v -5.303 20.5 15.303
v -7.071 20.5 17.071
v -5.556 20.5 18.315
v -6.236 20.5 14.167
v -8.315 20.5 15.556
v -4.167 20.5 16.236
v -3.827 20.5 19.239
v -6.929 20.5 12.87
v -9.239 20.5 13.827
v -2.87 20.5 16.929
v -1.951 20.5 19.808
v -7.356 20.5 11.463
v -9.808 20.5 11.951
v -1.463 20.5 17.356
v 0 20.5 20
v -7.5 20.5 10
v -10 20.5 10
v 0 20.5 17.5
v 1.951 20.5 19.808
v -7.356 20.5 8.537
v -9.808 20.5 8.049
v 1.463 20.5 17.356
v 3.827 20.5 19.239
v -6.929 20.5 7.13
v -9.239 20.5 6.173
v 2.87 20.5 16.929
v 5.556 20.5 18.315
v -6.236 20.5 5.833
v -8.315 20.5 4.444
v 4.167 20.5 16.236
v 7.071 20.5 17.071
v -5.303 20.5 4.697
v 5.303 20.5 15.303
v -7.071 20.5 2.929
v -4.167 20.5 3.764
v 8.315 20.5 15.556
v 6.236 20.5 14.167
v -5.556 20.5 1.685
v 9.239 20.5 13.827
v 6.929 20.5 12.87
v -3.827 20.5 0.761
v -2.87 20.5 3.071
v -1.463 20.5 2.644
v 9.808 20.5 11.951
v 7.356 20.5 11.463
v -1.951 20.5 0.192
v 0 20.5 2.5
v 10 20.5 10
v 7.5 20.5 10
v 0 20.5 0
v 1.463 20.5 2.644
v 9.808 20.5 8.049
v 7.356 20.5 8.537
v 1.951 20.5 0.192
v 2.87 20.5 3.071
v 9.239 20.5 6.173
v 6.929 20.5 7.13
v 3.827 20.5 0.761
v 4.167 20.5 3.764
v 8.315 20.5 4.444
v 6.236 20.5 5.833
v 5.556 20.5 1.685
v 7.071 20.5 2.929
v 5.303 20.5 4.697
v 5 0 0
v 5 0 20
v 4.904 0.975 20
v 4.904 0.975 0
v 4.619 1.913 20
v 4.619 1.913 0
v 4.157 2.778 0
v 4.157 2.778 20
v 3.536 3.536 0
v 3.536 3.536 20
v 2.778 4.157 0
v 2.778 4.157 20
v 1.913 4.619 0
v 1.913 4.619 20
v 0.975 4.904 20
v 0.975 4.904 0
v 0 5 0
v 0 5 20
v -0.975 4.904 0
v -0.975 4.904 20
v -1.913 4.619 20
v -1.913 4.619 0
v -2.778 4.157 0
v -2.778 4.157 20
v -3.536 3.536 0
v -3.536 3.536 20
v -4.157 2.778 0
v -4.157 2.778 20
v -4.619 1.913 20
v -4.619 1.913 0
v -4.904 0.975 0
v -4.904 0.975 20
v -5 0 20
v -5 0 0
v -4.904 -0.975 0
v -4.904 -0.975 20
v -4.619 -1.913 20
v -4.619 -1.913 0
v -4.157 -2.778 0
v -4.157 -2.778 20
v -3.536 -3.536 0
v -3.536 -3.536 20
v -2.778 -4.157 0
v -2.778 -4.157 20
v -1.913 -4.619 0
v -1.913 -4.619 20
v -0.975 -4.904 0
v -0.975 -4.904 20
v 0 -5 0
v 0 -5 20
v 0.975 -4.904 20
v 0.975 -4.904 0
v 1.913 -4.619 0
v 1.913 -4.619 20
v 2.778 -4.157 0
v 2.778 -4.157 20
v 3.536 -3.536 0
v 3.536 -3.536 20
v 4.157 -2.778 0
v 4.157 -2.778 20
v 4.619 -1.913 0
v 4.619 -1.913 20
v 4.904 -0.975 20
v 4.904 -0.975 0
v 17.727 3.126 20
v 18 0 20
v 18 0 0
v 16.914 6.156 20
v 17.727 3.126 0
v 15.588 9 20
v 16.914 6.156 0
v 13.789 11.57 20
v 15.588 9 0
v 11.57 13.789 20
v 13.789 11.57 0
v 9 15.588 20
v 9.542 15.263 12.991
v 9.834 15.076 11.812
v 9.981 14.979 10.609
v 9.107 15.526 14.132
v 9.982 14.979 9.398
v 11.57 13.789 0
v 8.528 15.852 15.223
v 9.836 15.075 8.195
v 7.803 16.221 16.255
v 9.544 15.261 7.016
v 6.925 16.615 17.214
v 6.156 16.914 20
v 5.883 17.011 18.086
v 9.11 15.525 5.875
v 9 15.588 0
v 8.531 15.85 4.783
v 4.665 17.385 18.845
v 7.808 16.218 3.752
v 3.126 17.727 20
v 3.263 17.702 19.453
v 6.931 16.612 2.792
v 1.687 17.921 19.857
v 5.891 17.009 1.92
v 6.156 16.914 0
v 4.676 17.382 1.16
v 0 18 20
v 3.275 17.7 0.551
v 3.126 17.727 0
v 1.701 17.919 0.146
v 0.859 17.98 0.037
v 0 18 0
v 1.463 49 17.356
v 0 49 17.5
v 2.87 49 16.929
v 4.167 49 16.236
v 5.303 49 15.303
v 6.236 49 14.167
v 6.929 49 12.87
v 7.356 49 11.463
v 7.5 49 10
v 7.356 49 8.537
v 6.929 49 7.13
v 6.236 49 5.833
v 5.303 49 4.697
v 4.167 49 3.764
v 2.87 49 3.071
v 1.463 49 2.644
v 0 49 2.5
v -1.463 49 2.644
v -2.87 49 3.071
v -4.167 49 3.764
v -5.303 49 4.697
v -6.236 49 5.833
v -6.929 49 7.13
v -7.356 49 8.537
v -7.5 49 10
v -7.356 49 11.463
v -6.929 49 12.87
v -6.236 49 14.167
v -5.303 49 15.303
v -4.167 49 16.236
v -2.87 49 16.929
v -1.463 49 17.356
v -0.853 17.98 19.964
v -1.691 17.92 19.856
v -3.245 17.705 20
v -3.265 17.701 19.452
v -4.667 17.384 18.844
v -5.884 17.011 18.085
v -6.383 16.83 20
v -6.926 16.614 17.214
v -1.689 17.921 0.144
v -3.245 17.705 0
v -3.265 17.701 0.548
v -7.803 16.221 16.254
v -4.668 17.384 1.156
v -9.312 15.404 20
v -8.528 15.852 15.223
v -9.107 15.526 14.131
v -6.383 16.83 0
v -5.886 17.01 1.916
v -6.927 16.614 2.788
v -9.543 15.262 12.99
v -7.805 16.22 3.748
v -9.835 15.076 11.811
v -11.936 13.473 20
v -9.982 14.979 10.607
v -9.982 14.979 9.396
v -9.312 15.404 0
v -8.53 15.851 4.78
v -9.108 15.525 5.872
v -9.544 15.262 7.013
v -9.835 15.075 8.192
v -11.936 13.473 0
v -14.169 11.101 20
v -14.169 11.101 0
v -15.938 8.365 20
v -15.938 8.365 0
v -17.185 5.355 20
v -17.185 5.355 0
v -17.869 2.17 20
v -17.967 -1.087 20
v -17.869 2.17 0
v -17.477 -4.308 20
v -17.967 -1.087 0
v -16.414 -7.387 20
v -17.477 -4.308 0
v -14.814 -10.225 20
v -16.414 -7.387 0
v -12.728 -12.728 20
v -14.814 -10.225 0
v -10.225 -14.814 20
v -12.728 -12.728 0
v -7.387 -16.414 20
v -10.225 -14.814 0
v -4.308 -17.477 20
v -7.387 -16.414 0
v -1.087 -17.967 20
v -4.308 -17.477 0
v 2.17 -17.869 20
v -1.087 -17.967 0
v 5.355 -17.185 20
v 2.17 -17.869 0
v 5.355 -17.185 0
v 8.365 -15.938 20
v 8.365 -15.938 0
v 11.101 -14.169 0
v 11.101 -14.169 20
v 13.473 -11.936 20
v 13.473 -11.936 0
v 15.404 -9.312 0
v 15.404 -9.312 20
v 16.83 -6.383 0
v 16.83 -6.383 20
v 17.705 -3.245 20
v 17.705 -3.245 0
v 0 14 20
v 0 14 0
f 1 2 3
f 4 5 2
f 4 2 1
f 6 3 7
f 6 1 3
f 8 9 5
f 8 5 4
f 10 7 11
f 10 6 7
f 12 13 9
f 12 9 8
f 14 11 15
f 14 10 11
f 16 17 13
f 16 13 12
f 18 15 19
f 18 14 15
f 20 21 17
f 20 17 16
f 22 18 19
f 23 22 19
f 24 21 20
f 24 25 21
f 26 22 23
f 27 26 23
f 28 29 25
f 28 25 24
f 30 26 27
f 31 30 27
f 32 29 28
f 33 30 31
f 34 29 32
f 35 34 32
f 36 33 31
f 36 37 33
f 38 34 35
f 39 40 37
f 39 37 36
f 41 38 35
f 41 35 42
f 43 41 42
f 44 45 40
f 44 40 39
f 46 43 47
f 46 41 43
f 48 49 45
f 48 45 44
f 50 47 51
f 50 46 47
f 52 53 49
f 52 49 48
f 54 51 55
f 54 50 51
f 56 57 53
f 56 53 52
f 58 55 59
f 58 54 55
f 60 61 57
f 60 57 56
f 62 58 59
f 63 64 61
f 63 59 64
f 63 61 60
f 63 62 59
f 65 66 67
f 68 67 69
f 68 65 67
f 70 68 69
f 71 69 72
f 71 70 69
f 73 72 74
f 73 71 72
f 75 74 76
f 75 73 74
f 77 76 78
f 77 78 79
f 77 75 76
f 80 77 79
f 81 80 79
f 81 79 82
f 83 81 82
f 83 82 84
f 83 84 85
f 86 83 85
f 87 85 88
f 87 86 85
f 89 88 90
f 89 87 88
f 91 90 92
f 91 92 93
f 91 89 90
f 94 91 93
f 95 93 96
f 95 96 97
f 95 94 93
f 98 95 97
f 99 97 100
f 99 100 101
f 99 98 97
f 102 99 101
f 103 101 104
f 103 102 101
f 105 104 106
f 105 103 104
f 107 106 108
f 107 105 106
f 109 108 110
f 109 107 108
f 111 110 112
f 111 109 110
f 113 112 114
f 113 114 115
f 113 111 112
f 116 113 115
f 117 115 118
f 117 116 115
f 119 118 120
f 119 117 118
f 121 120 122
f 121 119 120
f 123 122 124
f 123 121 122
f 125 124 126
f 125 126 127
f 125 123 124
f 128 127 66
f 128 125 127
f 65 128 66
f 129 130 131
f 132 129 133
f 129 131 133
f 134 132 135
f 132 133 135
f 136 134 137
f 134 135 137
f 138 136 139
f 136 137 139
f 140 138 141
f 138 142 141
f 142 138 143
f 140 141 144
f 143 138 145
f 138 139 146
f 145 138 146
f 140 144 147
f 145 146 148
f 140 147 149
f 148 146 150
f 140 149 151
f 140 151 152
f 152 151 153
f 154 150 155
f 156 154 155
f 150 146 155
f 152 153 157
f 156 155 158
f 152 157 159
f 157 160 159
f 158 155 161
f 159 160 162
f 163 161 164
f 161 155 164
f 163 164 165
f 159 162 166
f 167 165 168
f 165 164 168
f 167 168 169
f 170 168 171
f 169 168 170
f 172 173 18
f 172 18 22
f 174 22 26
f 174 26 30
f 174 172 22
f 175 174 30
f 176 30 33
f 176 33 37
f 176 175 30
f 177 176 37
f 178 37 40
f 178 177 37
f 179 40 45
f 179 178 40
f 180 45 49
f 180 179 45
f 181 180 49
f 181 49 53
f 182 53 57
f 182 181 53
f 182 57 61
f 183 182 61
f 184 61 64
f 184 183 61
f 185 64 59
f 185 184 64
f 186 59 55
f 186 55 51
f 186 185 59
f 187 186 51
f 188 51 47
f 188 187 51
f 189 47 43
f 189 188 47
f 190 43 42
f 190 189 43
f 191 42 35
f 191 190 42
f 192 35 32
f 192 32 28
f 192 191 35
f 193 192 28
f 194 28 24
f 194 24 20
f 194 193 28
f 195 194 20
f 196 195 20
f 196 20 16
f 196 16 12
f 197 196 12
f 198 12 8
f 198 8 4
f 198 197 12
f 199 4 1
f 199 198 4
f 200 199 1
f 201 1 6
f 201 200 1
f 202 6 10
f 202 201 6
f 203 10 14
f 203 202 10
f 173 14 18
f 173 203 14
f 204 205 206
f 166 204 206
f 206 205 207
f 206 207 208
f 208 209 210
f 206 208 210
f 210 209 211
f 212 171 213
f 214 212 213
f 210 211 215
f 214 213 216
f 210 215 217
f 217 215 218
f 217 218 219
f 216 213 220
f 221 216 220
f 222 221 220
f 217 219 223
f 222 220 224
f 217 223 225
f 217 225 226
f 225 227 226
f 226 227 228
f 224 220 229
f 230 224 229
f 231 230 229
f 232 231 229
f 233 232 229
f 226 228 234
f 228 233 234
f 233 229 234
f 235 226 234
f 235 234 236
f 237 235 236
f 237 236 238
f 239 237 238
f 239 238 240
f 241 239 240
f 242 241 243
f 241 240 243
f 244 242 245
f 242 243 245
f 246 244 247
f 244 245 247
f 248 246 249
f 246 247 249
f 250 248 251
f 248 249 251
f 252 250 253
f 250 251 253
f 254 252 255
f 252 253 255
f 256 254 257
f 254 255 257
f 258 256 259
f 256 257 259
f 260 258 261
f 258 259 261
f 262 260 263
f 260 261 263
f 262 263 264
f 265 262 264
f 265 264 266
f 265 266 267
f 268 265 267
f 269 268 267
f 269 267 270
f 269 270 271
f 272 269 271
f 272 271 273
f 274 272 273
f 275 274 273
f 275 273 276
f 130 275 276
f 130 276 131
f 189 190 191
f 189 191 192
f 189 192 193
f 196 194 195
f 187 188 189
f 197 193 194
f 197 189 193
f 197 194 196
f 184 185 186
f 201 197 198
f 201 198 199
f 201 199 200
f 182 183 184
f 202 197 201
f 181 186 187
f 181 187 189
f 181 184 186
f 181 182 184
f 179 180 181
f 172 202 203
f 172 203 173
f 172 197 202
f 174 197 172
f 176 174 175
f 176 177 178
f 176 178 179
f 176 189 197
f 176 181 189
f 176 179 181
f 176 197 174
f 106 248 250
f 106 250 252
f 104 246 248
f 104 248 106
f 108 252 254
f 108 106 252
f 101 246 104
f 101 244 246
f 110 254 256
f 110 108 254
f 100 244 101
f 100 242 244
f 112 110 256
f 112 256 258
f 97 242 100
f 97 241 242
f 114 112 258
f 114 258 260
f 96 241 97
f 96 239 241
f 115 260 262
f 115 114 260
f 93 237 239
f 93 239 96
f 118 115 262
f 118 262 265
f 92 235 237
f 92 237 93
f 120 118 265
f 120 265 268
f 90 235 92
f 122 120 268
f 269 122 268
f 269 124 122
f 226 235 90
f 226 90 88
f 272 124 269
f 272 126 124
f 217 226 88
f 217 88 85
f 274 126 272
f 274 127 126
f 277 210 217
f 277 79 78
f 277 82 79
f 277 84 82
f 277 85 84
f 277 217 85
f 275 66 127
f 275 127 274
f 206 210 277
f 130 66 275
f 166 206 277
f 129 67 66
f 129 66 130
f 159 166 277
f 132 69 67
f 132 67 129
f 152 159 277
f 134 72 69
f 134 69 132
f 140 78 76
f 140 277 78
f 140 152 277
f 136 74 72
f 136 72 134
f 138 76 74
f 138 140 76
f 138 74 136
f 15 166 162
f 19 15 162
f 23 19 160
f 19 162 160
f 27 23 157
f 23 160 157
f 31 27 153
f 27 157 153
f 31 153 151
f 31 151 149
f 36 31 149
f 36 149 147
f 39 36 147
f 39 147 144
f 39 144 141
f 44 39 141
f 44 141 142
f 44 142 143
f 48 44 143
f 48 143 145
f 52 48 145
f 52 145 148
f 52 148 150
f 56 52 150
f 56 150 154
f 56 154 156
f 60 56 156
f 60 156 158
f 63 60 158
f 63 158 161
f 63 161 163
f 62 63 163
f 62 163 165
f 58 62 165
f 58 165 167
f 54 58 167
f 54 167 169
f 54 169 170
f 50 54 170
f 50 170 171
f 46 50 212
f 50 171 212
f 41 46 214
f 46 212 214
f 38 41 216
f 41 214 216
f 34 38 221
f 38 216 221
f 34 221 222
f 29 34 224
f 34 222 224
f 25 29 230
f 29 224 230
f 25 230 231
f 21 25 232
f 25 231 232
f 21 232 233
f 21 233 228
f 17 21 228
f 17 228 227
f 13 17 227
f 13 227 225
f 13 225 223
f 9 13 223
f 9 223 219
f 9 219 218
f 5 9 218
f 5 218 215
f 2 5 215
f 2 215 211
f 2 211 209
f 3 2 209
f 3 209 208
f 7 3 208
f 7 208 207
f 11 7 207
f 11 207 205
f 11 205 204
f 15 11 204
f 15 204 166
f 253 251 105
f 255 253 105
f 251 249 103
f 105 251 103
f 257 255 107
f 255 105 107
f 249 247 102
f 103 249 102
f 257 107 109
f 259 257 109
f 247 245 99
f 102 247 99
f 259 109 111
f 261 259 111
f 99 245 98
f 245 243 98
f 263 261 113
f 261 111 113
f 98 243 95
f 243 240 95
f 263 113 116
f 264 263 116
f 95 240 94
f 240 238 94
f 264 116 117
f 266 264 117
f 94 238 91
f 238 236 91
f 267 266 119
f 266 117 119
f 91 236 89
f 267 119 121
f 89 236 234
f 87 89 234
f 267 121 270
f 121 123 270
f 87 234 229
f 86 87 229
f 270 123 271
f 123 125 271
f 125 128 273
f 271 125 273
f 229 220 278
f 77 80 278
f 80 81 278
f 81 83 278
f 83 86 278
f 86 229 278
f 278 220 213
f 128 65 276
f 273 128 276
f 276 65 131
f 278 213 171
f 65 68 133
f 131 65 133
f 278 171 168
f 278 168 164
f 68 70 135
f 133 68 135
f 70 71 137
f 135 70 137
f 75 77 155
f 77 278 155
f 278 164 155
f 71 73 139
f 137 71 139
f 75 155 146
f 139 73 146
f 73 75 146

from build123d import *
from build123d.topology import SkipClean

# Parameters (mm, degrees)
SKETCH_1_R          = 18
SKETCH_1_R_2        = 5
EXTRUDE_1_DEPTH     = 20
SKETCH_2_R          = 10
EXTRUDE_2_DEPTH     = 35
SKETCH_4_R          = 15
SKETCH_4_R_2        = 7.5
CUT_EXTRUDE_3_DEPTH = 28.5


with BuildPart() as part:
    # Эскиз1 → Вытянуть1 (new body)
    with BuildSketch(Plane.XY):
        Circle(SKETCH_1_R)
        Circle(SKETCH_1_R_2, mode=Mode.SUBTRACT)
    extrude(amount=EXTRUDE_1_DEPTH)

    # Эскиз2 → Вытянуть2 (add)
    with SkipClean():  # the faces are left unmerged after this step: merging them gives an invalid solid
        with BuildSketch(Plane(origin=(0, 14, 0), x_dir=(1, 0, 0), z_dir=(0, 1, 0))):
            with Locations(Location((0, -10, 0), (0, 0, 270))):
                Circle(SKETCH_2_R)
        extrude(amount=EXTRUDE_2_DEPTH)

    # Эскиз4 → Вытянуть3 (cut)
    with SkipClean():  # the faces are left unmerged after this step: merging them gives an invalid solid
        with BuildSketch(Plane(origin=(0, 49, 0), x_dir=(1, 0, 0), z_dir=(0, 1, 0))):
            with Locations((0, -10)):
                Circle(SKETCH_4_R)
            with Locations(Location((0, -10, 0), (0, 0, 270))):
                Circle(SKETCH_4_R_2, mode=Mode.SUBTRACT)
        extrude(amount=-CUT_EXTRUDE_3_DEPTH, mode=Mode.SUBTRACT)


solid = part.part
